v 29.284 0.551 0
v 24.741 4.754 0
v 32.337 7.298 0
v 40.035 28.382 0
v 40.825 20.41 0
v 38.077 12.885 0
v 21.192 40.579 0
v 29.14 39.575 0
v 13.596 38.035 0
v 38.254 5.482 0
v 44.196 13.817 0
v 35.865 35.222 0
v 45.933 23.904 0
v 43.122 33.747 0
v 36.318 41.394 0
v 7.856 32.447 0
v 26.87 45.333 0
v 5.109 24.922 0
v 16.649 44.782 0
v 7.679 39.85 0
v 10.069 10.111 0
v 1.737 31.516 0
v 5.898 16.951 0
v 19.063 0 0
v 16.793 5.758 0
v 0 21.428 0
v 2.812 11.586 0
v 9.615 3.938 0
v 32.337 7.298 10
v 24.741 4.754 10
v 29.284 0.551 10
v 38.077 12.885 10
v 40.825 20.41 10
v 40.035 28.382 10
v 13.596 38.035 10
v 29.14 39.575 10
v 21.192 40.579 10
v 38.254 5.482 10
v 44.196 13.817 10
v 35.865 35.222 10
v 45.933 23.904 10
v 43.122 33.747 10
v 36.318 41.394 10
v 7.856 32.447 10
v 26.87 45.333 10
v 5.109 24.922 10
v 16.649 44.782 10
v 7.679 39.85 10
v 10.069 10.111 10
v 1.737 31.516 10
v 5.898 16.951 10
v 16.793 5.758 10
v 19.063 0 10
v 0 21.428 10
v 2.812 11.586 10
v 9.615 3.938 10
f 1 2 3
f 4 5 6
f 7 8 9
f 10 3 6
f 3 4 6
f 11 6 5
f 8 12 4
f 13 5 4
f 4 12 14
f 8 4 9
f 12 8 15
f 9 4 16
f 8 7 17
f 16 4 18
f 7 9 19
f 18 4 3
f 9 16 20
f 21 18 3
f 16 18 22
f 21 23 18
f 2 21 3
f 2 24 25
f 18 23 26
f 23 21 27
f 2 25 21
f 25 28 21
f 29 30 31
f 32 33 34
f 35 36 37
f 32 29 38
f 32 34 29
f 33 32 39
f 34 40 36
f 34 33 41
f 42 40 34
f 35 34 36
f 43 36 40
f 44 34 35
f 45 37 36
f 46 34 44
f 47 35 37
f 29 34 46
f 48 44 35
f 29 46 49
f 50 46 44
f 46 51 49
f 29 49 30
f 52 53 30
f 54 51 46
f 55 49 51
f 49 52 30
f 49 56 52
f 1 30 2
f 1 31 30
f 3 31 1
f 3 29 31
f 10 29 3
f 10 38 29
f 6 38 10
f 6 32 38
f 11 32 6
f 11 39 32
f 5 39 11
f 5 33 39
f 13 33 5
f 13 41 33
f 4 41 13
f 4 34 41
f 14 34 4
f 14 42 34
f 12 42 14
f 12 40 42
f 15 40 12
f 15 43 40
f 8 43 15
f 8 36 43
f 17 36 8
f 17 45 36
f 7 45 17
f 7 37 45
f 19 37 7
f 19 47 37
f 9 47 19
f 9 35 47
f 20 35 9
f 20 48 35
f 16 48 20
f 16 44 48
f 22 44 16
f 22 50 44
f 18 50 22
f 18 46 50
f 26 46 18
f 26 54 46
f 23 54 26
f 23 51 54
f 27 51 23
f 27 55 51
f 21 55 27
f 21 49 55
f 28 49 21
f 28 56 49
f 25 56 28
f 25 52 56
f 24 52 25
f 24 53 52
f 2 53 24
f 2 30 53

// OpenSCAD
$fn = 32;

// ----------------------------------------------------------------------
// Chain sprocket: 14 teeth, 18 mm root radius
// ----------------------------------------------------------------------

// --- parameters (mm) ---
profile_height = 10;      // extrusion height
profile_points = 28;      // points of the closed outline

profile = [[40.825, 20.41], [45.933, 23.904], [40.035, 28.382], [43.122, 33.747], [35.865, 35.222], [36.318, 41.394], [29.14, 39.575], [26.87, 45.333], [21.192, 40.579], [16.649, 44.782], [13.596, 38.035], [7.679, 39.85], [7.856, 32.447], [1.737, 31.516], [5.109, 24.922], [0, 21.428], [5.898, 16.951], [2.812, 11.586], [10.069, 10.111], [9.615, 3.938], [16.793, 5.758], [19.063, 0], [24.741, 4.754], [29.284, 0.551], [32.337, 7.298], [38.254, 5.482], [38.077, 12.885], [44.196, 13.817]];  // single closed polygon, 28 points, counter clockwise

// --- the one profile operation ---
linear_extrude(height = profile_height) polygon(points = profile);
